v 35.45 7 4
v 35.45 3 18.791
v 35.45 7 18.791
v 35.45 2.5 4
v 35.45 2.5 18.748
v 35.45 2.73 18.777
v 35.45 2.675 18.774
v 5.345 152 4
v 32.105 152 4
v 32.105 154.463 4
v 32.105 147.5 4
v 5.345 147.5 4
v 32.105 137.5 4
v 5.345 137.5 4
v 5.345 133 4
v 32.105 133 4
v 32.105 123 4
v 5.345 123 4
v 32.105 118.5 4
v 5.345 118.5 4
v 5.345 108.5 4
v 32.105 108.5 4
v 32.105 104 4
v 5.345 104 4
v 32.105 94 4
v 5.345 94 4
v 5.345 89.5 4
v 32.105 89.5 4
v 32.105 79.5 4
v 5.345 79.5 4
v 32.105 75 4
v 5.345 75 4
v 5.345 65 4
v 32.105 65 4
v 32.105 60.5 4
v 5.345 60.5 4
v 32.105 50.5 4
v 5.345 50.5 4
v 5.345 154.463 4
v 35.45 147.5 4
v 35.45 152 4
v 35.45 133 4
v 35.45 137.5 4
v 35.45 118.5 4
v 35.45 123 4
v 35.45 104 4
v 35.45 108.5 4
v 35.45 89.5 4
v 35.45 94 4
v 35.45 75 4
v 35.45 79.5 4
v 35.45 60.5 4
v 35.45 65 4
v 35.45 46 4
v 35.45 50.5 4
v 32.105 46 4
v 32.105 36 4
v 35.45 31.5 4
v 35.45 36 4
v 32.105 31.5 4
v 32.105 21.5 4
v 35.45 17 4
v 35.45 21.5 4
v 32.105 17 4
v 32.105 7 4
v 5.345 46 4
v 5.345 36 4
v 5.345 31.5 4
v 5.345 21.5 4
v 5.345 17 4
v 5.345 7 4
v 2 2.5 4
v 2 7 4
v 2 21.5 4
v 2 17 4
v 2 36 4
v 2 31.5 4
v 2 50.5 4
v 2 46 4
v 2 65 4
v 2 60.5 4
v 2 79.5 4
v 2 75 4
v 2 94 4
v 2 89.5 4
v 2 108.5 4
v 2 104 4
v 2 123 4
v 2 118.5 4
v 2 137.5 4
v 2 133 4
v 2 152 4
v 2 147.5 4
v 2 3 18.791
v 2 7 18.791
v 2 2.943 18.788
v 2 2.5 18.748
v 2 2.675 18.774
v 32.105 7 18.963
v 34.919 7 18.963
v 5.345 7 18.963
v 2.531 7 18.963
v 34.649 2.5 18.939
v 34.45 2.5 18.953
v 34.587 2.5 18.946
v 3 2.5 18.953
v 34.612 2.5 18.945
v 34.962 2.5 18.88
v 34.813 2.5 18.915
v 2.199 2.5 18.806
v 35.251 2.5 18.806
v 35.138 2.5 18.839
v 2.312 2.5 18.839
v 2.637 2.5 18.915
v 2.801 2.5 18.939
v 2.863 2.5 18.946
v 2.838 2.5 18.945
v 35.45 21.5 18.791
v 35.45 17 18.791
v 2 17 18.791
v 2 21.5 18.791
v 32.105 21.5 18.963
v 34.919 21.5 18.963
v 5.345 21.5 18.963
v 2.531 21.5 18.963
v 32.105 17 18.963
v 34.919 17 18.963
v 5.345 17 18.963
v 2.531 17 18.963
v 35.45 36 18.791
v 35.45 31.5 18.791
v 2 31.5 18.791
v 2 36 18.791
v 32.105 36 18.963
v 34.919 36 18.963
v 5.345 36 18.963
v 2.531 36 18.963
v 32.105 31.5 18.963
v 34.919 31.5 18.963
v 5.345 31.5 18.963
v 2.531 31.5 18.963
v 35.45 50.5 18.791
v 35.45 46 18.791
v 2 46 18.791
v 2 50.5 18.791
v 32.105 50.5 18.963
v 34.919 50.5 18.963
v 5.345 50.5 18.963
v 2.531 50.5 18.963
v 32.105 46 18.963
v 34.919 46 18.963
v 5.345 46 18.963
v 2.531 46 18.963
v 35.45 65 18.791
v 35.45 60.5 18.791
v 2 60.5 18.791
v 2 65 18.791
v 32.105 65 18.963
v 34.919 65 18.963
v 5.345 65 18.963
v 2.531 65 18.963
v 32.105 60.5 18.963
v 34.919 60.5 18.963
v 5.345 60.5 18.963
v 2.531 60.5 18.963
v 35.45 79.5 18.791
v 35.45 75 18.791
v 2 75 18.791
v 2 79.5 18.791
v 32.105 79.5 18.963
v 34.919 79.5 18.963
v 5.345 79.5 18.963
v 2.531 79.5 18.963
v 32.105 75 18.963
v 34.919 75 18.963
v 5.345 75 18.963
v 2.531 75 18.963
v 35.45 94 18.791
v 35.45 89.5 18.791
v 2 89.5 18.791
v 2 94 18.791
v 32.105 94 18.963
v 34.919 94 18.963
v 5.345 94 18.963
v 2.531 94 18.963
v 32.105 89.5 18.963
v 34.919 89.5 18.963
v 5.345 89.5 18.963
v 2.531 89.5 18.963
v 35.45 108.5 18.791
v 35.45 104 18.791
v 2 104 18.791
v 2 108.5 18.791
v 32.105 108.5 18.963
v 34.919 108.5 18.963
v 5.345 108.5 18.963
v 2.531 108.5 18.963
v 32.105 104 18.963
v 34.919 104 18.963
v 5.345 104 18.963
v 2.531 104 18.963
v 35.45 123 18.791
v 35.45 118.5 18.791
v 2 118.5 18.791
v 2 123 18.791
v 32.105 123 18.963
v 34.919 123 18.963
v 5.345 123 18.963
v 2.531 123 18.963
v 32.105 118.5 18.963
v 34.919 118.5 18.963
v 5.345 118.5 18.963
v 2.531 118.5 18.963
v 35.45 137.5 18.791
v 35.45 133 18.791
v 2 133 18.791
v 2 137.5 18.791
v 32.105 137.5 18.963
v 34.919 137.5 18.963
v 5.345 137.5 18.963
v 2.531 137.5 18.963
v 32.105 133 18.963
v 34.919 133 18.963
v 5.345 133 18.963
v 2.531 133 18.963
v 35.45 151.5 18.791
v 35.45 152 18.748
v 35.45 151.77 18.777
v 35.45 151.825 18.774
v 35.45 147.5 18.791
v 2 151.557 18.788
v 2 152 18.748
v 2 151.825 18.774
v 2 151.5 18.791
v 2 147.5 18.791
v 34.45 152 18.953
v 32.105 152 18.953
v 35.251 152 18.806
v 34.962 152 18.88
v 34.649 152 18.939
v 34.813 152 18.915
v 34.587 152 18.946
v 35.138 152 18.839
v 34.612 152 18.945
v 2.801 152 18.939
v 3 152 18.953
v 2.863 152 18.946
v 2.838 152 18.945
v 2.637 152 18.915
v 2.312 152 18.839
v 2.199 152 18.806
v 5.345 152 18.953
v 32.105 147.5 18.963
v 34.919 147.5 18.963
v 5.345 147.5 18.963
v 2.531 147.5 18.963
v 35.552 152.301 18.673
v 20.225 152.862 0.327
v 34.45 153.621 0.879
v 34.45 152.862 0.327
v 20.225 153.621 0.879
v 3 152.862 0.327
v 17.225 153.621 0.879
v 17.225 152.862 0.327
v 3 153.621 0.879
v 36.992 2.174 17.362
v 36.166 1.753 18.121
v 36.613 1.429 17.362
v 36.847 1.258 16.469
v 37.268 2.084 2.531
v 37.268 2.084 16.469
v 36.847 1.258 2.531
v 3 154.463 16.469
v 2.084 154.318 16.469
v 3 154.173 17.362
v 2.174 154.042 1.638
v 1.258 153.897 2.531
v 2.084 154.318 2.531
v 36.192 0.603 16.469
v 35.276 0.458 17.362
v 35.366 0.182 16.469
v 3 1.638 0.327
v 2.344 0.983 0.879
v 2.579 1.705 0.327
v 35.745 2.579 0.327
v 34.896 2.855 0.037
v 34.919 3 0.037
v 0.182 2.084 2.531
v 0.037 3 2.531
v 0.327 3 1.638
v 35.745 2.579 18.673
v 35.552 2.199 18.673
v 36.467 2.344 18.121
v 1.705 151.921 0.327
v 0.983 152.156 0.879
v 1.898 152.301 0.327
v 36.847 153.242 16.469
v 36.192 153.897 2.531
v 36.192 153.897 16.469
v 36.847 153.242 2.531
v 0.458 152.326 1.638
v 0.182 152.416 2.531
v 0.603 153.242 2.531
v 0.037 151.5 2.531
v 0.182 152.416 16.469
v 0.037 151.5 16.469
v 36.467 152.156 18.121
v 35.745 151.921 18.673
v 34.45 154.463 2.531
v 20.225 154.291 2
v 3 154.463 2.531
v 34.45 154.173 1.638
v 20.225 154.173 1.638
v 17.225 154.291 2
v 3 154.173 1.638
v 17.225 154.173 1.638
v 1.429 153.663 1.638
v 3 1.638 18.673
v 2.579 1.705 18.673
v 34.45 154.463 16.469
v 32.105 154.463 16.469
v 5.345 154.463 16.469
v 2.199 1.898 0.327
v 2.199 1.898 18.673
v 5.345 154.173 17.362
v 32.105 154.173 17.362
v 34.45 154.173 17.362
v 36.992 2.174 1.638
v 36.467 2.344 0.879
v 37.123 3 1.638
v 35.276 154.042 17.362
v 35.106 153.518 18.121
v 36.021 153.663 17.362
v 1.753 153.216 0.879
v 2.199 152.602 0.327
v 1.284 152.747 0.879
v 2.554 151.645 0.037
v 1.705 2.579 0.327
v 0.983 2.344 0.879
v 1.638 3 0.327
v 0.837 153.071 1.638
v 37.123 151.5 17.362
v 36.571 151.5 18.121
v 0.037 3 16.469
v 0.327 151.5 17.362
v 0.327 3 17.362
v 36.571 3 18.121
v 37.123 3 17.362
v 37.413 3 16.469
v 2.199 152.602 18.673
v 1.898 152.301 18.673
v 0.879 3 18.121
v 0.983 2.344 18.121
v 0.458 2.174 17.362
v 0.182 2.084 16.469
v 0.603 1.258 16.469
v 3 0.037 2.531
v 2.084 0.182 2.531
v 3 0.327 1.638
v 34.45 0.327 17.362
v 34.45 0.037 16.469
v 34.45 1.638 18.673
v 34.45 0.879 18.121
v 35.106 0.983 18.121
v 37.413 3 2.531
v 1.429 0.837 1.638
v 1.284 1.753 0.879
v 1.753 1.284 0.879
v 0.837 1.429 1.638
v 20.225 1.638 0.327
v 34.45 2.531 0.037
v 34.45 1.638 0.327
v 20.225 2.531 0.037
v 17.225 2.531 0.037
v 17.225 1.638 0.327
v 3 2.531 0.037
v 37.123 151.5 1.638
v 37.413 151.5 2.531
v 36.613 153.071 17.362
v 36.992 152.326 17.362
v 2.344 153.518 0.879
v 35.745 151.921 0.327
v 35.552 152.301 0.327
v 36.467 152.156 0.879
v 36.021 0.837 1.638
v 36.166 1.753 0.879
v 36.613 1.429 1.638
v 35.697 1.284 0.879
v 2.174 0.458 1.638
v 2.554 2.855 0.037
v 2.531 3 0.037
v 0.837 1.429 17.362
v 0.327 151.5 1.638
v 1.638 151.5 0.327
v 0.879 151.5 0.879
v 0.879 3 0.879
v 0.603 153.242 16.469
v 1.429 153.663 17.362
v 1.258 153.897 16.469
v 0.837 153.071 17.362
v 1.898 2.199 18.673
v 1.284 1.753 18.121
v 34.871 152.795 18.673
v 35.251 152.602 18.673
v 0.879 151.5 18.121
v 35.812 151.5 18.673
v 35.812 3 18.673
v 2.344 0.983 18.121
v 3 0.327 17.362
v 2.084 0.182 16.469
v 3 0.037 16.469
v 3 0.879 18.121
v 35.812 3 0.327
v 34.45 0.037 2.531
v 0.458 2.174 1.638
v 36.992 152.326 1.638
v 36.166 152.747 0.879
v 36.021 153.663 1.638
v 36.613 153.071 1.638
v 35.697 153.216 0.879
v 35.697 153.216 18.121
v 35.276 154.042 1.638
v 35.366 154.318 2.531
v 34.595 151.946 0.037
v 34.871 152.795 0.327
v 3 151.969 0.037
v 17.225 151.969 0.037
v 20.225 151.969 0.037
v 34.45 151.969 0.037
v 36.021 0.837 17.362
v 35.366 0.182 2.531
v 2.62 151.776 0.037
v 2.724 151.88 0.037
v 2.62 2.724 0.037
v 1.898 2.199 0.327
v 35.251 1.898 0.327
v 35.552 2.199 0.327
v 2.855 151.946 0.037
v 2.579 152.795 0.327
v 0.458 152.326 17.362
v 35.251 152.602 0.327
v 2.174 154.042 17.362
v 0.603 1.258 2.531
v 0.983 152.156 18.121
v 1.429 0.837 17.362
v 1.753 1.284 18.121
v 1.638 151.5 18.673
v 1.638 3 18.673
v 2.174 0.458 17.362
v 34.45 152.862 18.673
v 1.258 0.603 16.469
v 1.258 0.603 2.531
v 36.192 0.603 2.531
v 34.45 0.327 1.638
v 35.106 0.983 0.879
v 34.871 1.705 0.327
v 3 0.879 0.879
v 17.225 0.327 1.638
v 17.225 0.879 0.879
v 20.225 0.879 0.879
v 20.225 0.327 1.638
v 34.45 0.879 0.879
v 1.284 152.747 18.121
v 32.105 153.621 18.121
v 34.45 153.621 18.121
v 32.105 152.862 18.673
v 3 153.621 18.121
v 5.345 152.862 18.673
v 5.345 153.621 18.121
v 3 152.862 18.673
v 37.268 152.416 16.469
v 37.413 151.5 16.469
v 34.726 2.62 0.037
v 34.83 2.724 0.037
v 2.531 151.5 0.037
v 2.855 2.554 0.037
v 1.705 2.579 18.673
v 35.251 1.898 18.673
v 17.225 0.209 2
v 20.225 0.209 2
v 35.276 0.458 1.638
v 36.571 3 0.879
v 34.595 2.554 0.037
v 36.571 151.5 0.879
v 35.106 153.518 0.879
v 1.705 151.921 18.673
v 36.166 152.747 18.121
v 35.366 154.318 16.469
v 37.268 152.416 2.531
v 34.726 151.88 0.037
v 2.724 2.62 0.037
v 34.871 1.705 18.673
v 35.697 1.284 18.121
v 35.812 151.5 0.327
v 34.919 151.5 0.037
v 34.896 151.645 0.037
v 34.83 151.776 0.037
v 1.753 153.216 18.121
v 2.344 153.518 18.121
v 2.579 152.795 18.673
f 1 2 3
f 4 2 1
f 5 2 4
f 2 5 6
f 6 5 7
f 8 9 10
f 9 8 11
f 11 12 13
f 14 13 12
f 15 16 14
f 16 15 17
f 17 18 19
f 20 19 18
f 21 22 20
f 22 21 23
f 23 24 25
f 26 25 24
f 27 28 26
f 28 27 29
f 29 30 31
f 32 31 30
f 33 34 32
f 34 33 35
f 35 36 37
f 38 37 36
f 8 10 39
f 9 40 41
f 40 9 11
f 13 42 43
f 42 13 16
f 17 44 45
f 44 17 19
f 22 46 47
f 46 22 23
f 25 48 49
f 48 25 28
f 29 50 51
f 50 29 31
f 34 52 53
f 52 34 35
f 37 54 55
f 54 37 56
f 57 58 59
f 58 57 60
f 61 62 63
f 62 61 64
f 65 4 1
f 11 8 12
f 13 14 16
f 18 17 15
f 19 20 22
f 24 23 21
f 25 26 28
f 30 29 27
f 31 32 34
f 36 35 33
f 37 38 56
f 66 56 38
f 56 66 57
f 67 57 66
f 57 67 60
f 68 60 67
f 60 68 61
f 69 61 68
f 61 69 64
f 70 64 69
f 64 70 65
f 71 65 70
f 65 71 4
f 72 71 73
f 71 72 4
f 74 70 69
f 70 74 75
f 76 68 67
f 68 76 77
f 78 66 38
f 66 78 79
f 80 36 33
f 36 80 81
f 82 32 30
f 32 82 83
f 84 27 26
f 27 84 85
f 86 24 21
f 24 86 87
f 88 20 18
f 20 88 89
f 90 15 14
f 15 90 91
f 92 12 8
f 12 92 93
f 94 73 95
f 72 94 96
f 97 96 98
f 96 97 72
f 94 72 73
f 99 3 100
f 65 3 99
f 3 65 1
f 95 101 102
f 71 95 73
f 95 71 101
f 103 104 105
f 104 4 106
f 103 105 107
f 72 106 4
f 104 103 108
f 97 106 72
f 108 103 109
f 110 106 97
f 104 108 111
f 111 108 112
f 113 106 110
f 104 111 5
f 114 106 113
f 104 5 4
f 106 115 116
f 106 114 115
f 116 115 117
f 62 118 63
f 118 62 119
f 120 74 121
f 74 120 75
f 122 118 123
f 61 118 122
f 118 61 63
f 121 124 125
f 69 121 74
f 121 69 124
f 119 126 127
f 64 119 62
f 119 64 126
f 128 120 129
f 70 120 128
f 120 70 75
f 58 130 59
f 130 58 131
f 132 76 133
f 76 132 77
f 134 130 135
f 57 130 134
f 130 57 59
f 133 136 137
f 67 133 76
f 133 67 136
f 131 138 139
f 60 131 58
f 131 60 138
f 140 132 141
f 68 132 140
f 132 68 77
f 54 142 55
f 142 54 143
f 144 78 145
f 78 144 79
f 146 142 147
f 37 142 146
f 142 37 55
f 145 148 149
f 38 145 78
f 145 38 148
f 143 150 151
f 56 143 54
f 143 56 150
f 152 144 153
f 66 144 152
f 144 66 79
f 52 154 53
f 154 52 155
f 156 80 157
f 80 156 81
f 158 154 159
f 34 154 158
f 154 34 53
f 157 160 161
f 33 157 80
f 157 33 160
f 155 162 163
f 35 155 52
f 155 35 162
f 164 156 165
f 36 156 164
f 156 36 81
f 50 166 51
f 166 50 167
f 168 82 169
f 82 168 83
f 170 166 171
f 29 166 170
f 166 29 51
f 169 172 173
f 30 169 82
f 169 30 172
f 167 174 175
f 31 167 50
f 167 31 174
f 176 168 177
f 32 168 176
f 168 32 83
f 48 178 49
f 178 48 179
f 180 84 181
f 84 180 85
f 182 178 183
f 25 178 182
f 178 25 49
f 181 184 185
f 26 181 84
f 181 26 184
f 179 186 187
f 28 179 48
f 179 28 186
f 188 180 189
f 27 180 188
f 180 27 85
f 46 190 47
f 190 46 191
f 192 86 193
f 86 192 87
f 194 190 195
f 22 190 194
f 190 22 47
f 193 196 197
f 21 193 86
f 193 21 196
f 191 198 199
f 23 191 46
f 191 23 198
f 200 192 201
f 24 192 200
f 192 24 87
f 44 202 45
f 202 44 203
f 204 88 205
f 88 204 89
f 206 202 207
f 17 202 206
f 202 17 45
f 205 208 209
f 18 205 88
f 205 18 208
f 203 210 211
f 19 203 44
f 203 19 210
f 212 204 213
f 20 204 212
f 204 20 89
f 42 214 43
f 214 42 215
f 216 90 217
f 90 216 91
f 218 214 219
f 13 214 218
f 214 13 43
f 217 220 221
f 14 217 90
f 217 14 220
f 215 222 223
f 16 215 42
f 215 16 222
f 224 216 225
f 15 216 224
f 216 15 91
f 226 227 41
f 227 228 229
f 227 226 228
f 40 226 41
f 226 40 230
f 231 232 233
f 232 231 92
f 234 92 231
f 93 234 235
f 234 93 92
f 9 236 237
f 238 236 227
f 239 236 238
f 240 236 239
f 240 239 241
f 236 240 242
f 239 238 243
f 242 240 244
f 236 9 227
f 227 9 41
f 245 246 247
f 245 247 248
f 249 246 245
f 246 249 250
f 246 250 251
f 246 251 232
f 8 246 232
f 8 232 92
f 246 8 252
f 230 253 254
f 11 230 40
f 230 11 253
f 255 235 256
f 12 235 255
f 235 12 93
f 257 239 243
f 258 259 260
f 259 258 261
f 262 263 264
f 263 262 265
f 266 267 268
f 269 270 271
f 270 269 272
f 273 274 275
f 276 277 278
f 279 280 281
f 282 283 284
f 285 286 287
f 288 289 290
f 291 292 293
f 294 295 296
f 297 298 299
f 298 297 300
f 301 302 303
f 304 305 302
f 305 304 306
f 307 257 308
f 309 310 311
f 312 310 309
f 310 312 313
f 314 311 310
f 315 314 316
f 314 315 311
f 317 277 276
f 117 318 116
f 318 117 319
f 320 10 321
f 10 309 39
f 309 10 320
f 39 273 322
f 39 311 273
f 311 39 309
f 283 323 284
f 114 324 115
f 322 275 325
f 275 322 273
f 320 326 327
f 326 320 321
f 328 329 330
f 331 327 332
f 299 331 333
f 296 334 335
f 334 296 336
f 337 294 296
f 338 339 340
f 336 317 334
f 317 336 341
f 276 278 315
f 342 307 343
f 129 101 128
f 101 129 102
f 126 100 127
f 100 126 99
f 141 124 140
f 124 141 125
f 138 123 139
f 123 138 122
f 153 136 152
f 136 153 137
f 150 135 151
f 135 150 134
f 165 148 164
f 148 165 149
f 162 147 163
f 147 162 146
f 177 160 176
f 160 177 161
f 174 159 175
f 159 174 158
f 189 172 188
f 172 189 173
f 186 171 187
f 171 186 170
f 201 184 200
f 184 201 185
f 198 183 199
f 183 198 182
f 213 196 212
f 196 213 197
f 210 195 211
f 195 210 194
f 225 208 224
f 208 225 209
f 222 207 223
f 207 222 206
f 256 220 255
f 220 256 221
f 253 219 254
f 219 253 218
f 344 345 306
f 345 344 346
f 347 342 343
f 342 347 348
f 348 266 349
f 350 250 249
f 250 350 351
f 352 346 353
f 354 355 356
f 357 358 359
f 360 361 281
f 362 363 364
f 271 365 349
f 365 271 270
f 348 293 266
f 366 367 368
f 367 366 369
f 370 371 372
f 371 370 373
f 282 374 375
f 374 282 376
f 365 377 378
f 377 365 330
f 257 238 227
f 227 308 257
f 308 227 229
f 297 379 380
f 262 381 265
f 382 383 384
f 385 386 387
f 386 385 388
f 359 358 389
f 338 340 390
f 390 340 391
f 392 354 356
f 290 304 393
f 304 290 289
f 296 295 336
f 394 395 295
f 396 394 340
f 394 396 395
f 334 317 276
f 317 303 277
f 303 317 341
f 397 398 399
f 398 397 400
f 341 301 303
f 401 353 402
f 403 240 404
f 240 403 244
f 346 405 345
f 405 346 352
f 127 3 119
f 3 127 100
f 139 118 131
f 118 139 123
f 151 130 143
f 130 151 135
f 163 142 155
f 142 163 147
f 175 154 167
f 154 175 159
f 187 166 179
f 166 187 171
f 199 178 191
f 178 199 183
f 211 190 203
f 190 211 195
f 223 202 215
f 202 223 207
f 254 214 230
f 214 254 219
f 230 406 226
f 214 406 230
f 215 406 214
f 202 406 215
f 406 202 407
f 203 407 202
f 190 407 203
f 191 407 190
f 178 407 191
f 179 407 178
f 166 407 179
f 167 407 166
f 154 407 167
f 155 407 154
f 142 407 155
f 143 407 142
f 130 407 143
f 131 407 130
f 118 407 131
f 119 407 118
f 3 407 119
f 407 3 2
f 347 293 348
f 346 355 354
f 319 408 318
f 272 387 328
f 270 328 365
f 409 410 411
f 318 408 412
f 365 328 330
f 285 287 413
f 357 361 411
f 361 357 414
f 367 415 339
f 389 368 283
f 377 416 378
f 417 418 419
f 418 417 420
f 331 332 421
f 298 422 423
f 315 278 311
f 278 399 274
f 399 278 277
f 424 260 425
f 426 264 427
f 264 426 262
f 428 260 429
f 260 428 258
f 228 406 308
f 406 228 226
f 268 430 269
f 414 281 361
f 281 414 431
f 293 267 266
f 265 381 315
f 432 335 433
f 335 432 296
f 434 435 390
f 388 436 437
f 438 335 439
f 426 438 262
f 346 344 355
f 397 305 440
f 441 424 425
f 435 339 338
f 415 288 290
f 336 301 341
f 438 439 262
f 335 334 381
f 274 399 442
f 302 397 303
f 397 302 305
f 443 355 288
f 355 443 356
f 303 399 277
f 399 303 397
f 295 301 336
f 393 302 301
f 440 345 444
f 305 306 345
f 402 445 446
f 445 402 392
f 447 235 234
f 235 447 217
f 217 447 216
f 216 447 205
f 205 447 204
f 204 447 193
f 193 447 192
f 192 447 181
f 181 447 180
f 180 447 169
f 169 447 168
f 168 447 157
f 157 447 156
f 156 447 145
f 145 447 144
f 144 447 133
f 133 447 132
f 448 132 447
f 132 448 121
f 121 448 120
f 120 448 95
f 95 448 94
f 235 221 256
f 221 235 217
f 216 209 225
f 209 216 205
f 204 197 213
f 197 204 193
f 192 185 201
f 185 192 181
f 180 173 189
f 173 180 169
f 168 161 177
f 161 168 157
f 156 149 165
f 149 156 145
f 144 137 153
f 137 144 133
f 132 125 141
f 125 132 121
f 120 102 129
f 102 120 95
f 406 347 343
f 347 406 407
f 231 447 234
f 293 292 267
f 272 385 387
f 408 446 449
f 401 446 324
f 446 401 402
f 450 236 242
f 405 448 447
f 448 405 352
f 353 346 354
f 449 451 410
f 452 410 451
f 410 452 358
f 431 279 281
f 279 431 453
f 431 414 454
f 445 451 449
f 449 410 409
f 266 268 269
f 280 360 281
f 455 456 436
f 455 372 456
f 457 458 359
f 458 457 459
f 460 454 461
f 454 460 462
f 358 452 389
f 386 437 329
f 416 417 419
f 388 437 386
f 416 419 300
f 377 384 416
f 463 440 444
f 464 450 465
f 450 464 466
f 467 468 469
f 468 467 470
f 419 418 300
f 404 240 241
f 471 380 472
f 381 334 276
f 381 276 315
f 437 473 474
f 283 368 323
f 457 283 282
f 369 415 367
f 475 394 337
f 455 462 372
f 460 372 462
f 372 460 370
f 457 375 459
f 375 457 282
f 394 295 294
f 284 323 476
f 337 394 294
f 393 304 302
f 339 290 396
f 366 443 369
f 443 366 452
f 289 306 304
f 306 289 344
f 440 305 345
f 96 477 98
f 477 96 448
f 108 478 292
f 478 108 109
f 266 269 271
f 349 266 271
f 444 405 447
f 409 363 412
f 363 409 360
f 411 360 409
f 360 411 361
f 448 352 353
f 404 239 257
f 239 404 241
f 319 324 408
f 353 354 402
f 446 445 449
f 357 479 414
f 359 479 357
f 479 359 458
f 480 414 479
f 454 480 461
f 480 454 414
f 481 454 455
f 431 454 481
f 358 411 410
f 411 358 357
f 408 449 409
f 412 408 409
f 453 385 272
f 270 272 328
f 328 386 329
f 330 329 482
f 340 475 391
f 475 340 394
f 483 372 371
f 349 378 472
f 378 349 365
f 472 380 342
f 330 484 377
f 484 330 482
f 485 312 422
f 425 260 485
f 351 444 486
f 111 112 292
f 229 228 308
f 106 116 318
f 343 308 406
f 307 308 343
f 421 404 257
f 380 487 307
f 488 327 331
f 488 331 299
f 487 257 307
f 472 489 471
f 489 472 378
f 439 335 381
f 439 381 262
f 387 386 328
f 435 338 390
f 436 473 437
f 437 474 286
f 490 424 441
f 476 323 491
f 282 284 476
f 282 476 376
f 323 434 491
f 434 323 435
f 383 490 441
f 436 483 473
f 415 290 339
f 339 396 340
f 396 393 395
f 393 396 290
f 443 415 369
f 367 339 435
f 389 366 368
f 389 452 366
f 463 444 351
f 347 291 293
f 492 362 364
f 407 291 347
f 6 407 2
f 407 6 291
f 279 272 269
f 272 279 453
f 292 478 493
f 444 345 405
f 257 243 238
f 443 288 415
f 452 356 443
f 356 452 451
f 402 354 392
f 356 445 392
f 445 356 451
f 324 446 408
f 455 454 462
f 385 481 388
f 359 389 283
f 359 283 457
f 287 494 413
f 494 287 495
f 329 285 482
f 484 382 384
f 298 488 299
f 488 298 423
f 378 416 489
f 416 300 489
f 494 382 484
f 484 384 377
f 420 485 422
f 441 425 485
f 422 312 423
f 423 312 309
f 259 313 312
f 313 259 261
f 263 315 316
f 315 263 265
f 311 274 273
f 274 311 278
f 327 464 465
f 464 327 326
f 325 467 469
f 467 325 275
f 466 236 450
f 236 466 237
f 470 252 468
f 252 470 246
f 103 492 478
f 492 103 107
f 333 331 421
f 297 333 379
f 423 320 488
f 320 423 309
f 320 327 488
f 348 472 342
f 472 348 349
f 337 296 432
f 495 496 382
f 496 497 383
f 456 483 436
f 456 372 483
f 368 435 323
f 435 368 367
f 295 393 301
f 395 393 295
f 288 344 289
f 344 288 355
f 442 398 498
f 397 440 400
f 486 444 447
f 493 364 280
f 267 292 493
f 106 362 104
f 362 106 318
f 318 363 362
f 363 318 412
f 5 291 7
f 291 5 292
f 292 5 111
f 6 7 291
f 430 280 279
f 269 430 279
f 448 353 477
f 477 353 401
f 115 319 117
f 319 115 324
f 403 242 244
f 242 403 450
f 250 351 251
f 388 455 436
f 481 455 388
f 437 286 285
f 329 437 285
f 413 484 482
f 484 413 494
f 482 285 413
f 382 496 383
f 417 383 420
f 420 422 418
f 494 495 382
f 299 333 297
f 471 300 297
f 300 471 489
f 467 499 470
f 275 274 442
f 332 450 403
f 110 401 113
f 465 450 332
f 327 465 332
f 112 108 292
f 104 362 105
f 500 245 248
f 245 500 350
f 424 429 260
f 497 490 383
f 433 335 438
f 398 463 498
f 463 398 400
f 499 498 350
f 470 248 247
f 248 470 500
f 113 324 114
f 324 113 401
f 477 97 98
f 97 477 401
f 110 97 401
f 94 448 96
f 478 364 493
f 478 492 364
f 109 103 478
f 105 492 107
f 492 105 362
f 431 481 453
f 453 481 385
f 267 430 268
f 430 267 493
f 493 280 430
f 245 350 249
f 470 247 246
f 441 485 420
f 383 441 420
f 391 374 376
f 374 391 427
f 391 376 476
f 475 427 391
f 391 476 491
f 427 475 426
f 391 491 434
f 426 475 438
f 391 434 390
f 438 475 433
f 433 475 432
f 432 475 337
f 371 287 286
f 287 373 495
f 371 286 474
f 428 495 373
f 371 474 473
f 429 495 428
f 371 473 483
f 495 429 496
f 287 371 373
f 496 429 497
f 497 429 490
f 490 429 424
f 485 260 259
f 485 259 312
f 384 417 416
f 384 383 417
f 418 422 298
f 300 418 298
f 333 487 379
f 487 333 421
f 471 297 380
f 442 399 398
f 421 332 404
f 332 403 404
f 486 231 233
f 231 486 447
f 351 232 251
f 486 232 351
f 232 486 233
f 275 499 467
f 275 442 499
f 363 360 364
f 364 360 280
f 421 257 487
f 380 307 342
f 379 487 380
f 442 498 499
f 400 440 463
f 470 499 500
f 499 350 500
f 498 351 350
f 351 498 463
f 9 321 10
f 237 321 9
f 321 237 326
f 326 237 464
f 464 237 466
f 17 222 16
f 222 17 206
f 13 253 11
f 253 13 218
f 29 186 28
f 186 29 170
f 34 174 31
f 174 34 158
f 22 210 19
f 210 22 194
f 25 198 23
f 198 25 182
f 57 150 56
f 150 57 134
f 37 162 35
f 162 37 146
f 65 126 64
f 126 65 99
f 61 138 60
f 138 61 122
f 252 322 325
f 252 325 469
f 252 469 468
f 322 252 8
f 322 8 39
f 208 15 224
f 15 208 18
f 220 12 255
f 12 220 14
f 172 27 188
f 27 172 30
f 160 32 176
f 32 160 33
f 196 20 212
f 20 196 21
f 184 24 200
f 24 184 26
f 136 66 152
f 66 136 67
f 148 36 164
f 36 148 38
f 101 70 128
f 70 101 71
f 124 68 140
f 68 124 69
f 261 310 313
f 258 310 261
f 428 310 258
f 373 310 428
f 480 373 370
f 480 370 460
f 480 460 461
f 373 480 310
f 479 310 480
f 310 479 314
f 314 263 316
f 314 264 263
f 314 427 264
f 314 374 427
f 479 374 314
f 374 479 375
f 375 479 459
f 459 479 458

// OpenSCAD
//Constants
stuffz = 2/1;
fuzz = 0.2/1+.5;
real_card_length = 34.95/1;
real_card_width = 32.75/1;
real_card_thick = 3.8/1;
card_length = real_card_length + fuzz;
card_width = real_card_width + fuzz;
card_thick = real_card_thick + fuzz;

//DS Box
number_of_cards = 11; //[1:20]
box_height_addition = 15; //[10: 32]
gutter_height = 2; //[1:5]
gutter_width = 3; //[1:5]
card_spacing = 10; //[2:10]
card_spacing_ends = 2.5;
$fn = 20;
cube_r = 3; //[1 : 5]

box(number_of_cards);

//----------------------------

module card()
{
  cube([card_width,card_thick,card_length]);
}

module box(number)
{
  	box_x = card_width + stuffz*2;
  	box_y = 2*card_spacing_ends - card_spacing + (card_thick + card_spacing) * number;
  	box_z = gutter_height+ stuffz + box_height_addition;
  	card_x_trans = box_x / 2 - card_width /2;
 
	cutout=0.80/1;
 	//%cube([box_x, box_y, box_z]);

  	difference()
	{
    	roundCornerCube(box_x,box_y,box_z,cube_r);

		//hollow out
		translate([card_x_trans+card_width*(1-cutout)/2, card_spacing_ends,gutter_height+stuffz]) 
			cube([card_width*cutout, (card_thick + card_spacing) * number , box_z]);

    	//gutter
    	translate([(box_x/2) - (gutter_width/2),-fuzz,-fuzz]) 
			cube([gutter_width, box_y + (fuzz*2),gutter_height+fuzz]);

    	//cards
    	for (i = [0 : number-1])
		{
      		translate([card_x_trans, card_spacing_ends + (card_thick + card_spacing)*i,gutter_height+stuffz]) 
				rotate([0,0,0]) card();
    	}

  	}
}

module roundCornerCube(x,y,z,r_sphere)
{
r = r_sphere;
if (x < r) {echo ("roundCornerCube: error: x < r !!");}
if (y < r) {echo ("roundCornerCube: error: y < r !!");}
if (z < r) {echo ("roundCornerCube: error: z < r !!");}
	hull(){
		translate([r,y-r,z-r]) sphere(r_sphere); //1!
		translate([x-r,y-r,z-r]) sphere(r_sphere); //2
		translate([r,r,z-r]) sphere(r_sphere); //3
		translate([x-r,r,z-r]) sphere(r_sphere); //4
		translate([r,y-r,r]) sphere(r_sphere); //5!
		translate([x-r,y-r,r]) sphere(r_sphere); //6		
		translate([r,r,r]) sphere(r_sphere); //7
		translate([x-r,r,r]) sphere(r_sphere); //8
	}
}
